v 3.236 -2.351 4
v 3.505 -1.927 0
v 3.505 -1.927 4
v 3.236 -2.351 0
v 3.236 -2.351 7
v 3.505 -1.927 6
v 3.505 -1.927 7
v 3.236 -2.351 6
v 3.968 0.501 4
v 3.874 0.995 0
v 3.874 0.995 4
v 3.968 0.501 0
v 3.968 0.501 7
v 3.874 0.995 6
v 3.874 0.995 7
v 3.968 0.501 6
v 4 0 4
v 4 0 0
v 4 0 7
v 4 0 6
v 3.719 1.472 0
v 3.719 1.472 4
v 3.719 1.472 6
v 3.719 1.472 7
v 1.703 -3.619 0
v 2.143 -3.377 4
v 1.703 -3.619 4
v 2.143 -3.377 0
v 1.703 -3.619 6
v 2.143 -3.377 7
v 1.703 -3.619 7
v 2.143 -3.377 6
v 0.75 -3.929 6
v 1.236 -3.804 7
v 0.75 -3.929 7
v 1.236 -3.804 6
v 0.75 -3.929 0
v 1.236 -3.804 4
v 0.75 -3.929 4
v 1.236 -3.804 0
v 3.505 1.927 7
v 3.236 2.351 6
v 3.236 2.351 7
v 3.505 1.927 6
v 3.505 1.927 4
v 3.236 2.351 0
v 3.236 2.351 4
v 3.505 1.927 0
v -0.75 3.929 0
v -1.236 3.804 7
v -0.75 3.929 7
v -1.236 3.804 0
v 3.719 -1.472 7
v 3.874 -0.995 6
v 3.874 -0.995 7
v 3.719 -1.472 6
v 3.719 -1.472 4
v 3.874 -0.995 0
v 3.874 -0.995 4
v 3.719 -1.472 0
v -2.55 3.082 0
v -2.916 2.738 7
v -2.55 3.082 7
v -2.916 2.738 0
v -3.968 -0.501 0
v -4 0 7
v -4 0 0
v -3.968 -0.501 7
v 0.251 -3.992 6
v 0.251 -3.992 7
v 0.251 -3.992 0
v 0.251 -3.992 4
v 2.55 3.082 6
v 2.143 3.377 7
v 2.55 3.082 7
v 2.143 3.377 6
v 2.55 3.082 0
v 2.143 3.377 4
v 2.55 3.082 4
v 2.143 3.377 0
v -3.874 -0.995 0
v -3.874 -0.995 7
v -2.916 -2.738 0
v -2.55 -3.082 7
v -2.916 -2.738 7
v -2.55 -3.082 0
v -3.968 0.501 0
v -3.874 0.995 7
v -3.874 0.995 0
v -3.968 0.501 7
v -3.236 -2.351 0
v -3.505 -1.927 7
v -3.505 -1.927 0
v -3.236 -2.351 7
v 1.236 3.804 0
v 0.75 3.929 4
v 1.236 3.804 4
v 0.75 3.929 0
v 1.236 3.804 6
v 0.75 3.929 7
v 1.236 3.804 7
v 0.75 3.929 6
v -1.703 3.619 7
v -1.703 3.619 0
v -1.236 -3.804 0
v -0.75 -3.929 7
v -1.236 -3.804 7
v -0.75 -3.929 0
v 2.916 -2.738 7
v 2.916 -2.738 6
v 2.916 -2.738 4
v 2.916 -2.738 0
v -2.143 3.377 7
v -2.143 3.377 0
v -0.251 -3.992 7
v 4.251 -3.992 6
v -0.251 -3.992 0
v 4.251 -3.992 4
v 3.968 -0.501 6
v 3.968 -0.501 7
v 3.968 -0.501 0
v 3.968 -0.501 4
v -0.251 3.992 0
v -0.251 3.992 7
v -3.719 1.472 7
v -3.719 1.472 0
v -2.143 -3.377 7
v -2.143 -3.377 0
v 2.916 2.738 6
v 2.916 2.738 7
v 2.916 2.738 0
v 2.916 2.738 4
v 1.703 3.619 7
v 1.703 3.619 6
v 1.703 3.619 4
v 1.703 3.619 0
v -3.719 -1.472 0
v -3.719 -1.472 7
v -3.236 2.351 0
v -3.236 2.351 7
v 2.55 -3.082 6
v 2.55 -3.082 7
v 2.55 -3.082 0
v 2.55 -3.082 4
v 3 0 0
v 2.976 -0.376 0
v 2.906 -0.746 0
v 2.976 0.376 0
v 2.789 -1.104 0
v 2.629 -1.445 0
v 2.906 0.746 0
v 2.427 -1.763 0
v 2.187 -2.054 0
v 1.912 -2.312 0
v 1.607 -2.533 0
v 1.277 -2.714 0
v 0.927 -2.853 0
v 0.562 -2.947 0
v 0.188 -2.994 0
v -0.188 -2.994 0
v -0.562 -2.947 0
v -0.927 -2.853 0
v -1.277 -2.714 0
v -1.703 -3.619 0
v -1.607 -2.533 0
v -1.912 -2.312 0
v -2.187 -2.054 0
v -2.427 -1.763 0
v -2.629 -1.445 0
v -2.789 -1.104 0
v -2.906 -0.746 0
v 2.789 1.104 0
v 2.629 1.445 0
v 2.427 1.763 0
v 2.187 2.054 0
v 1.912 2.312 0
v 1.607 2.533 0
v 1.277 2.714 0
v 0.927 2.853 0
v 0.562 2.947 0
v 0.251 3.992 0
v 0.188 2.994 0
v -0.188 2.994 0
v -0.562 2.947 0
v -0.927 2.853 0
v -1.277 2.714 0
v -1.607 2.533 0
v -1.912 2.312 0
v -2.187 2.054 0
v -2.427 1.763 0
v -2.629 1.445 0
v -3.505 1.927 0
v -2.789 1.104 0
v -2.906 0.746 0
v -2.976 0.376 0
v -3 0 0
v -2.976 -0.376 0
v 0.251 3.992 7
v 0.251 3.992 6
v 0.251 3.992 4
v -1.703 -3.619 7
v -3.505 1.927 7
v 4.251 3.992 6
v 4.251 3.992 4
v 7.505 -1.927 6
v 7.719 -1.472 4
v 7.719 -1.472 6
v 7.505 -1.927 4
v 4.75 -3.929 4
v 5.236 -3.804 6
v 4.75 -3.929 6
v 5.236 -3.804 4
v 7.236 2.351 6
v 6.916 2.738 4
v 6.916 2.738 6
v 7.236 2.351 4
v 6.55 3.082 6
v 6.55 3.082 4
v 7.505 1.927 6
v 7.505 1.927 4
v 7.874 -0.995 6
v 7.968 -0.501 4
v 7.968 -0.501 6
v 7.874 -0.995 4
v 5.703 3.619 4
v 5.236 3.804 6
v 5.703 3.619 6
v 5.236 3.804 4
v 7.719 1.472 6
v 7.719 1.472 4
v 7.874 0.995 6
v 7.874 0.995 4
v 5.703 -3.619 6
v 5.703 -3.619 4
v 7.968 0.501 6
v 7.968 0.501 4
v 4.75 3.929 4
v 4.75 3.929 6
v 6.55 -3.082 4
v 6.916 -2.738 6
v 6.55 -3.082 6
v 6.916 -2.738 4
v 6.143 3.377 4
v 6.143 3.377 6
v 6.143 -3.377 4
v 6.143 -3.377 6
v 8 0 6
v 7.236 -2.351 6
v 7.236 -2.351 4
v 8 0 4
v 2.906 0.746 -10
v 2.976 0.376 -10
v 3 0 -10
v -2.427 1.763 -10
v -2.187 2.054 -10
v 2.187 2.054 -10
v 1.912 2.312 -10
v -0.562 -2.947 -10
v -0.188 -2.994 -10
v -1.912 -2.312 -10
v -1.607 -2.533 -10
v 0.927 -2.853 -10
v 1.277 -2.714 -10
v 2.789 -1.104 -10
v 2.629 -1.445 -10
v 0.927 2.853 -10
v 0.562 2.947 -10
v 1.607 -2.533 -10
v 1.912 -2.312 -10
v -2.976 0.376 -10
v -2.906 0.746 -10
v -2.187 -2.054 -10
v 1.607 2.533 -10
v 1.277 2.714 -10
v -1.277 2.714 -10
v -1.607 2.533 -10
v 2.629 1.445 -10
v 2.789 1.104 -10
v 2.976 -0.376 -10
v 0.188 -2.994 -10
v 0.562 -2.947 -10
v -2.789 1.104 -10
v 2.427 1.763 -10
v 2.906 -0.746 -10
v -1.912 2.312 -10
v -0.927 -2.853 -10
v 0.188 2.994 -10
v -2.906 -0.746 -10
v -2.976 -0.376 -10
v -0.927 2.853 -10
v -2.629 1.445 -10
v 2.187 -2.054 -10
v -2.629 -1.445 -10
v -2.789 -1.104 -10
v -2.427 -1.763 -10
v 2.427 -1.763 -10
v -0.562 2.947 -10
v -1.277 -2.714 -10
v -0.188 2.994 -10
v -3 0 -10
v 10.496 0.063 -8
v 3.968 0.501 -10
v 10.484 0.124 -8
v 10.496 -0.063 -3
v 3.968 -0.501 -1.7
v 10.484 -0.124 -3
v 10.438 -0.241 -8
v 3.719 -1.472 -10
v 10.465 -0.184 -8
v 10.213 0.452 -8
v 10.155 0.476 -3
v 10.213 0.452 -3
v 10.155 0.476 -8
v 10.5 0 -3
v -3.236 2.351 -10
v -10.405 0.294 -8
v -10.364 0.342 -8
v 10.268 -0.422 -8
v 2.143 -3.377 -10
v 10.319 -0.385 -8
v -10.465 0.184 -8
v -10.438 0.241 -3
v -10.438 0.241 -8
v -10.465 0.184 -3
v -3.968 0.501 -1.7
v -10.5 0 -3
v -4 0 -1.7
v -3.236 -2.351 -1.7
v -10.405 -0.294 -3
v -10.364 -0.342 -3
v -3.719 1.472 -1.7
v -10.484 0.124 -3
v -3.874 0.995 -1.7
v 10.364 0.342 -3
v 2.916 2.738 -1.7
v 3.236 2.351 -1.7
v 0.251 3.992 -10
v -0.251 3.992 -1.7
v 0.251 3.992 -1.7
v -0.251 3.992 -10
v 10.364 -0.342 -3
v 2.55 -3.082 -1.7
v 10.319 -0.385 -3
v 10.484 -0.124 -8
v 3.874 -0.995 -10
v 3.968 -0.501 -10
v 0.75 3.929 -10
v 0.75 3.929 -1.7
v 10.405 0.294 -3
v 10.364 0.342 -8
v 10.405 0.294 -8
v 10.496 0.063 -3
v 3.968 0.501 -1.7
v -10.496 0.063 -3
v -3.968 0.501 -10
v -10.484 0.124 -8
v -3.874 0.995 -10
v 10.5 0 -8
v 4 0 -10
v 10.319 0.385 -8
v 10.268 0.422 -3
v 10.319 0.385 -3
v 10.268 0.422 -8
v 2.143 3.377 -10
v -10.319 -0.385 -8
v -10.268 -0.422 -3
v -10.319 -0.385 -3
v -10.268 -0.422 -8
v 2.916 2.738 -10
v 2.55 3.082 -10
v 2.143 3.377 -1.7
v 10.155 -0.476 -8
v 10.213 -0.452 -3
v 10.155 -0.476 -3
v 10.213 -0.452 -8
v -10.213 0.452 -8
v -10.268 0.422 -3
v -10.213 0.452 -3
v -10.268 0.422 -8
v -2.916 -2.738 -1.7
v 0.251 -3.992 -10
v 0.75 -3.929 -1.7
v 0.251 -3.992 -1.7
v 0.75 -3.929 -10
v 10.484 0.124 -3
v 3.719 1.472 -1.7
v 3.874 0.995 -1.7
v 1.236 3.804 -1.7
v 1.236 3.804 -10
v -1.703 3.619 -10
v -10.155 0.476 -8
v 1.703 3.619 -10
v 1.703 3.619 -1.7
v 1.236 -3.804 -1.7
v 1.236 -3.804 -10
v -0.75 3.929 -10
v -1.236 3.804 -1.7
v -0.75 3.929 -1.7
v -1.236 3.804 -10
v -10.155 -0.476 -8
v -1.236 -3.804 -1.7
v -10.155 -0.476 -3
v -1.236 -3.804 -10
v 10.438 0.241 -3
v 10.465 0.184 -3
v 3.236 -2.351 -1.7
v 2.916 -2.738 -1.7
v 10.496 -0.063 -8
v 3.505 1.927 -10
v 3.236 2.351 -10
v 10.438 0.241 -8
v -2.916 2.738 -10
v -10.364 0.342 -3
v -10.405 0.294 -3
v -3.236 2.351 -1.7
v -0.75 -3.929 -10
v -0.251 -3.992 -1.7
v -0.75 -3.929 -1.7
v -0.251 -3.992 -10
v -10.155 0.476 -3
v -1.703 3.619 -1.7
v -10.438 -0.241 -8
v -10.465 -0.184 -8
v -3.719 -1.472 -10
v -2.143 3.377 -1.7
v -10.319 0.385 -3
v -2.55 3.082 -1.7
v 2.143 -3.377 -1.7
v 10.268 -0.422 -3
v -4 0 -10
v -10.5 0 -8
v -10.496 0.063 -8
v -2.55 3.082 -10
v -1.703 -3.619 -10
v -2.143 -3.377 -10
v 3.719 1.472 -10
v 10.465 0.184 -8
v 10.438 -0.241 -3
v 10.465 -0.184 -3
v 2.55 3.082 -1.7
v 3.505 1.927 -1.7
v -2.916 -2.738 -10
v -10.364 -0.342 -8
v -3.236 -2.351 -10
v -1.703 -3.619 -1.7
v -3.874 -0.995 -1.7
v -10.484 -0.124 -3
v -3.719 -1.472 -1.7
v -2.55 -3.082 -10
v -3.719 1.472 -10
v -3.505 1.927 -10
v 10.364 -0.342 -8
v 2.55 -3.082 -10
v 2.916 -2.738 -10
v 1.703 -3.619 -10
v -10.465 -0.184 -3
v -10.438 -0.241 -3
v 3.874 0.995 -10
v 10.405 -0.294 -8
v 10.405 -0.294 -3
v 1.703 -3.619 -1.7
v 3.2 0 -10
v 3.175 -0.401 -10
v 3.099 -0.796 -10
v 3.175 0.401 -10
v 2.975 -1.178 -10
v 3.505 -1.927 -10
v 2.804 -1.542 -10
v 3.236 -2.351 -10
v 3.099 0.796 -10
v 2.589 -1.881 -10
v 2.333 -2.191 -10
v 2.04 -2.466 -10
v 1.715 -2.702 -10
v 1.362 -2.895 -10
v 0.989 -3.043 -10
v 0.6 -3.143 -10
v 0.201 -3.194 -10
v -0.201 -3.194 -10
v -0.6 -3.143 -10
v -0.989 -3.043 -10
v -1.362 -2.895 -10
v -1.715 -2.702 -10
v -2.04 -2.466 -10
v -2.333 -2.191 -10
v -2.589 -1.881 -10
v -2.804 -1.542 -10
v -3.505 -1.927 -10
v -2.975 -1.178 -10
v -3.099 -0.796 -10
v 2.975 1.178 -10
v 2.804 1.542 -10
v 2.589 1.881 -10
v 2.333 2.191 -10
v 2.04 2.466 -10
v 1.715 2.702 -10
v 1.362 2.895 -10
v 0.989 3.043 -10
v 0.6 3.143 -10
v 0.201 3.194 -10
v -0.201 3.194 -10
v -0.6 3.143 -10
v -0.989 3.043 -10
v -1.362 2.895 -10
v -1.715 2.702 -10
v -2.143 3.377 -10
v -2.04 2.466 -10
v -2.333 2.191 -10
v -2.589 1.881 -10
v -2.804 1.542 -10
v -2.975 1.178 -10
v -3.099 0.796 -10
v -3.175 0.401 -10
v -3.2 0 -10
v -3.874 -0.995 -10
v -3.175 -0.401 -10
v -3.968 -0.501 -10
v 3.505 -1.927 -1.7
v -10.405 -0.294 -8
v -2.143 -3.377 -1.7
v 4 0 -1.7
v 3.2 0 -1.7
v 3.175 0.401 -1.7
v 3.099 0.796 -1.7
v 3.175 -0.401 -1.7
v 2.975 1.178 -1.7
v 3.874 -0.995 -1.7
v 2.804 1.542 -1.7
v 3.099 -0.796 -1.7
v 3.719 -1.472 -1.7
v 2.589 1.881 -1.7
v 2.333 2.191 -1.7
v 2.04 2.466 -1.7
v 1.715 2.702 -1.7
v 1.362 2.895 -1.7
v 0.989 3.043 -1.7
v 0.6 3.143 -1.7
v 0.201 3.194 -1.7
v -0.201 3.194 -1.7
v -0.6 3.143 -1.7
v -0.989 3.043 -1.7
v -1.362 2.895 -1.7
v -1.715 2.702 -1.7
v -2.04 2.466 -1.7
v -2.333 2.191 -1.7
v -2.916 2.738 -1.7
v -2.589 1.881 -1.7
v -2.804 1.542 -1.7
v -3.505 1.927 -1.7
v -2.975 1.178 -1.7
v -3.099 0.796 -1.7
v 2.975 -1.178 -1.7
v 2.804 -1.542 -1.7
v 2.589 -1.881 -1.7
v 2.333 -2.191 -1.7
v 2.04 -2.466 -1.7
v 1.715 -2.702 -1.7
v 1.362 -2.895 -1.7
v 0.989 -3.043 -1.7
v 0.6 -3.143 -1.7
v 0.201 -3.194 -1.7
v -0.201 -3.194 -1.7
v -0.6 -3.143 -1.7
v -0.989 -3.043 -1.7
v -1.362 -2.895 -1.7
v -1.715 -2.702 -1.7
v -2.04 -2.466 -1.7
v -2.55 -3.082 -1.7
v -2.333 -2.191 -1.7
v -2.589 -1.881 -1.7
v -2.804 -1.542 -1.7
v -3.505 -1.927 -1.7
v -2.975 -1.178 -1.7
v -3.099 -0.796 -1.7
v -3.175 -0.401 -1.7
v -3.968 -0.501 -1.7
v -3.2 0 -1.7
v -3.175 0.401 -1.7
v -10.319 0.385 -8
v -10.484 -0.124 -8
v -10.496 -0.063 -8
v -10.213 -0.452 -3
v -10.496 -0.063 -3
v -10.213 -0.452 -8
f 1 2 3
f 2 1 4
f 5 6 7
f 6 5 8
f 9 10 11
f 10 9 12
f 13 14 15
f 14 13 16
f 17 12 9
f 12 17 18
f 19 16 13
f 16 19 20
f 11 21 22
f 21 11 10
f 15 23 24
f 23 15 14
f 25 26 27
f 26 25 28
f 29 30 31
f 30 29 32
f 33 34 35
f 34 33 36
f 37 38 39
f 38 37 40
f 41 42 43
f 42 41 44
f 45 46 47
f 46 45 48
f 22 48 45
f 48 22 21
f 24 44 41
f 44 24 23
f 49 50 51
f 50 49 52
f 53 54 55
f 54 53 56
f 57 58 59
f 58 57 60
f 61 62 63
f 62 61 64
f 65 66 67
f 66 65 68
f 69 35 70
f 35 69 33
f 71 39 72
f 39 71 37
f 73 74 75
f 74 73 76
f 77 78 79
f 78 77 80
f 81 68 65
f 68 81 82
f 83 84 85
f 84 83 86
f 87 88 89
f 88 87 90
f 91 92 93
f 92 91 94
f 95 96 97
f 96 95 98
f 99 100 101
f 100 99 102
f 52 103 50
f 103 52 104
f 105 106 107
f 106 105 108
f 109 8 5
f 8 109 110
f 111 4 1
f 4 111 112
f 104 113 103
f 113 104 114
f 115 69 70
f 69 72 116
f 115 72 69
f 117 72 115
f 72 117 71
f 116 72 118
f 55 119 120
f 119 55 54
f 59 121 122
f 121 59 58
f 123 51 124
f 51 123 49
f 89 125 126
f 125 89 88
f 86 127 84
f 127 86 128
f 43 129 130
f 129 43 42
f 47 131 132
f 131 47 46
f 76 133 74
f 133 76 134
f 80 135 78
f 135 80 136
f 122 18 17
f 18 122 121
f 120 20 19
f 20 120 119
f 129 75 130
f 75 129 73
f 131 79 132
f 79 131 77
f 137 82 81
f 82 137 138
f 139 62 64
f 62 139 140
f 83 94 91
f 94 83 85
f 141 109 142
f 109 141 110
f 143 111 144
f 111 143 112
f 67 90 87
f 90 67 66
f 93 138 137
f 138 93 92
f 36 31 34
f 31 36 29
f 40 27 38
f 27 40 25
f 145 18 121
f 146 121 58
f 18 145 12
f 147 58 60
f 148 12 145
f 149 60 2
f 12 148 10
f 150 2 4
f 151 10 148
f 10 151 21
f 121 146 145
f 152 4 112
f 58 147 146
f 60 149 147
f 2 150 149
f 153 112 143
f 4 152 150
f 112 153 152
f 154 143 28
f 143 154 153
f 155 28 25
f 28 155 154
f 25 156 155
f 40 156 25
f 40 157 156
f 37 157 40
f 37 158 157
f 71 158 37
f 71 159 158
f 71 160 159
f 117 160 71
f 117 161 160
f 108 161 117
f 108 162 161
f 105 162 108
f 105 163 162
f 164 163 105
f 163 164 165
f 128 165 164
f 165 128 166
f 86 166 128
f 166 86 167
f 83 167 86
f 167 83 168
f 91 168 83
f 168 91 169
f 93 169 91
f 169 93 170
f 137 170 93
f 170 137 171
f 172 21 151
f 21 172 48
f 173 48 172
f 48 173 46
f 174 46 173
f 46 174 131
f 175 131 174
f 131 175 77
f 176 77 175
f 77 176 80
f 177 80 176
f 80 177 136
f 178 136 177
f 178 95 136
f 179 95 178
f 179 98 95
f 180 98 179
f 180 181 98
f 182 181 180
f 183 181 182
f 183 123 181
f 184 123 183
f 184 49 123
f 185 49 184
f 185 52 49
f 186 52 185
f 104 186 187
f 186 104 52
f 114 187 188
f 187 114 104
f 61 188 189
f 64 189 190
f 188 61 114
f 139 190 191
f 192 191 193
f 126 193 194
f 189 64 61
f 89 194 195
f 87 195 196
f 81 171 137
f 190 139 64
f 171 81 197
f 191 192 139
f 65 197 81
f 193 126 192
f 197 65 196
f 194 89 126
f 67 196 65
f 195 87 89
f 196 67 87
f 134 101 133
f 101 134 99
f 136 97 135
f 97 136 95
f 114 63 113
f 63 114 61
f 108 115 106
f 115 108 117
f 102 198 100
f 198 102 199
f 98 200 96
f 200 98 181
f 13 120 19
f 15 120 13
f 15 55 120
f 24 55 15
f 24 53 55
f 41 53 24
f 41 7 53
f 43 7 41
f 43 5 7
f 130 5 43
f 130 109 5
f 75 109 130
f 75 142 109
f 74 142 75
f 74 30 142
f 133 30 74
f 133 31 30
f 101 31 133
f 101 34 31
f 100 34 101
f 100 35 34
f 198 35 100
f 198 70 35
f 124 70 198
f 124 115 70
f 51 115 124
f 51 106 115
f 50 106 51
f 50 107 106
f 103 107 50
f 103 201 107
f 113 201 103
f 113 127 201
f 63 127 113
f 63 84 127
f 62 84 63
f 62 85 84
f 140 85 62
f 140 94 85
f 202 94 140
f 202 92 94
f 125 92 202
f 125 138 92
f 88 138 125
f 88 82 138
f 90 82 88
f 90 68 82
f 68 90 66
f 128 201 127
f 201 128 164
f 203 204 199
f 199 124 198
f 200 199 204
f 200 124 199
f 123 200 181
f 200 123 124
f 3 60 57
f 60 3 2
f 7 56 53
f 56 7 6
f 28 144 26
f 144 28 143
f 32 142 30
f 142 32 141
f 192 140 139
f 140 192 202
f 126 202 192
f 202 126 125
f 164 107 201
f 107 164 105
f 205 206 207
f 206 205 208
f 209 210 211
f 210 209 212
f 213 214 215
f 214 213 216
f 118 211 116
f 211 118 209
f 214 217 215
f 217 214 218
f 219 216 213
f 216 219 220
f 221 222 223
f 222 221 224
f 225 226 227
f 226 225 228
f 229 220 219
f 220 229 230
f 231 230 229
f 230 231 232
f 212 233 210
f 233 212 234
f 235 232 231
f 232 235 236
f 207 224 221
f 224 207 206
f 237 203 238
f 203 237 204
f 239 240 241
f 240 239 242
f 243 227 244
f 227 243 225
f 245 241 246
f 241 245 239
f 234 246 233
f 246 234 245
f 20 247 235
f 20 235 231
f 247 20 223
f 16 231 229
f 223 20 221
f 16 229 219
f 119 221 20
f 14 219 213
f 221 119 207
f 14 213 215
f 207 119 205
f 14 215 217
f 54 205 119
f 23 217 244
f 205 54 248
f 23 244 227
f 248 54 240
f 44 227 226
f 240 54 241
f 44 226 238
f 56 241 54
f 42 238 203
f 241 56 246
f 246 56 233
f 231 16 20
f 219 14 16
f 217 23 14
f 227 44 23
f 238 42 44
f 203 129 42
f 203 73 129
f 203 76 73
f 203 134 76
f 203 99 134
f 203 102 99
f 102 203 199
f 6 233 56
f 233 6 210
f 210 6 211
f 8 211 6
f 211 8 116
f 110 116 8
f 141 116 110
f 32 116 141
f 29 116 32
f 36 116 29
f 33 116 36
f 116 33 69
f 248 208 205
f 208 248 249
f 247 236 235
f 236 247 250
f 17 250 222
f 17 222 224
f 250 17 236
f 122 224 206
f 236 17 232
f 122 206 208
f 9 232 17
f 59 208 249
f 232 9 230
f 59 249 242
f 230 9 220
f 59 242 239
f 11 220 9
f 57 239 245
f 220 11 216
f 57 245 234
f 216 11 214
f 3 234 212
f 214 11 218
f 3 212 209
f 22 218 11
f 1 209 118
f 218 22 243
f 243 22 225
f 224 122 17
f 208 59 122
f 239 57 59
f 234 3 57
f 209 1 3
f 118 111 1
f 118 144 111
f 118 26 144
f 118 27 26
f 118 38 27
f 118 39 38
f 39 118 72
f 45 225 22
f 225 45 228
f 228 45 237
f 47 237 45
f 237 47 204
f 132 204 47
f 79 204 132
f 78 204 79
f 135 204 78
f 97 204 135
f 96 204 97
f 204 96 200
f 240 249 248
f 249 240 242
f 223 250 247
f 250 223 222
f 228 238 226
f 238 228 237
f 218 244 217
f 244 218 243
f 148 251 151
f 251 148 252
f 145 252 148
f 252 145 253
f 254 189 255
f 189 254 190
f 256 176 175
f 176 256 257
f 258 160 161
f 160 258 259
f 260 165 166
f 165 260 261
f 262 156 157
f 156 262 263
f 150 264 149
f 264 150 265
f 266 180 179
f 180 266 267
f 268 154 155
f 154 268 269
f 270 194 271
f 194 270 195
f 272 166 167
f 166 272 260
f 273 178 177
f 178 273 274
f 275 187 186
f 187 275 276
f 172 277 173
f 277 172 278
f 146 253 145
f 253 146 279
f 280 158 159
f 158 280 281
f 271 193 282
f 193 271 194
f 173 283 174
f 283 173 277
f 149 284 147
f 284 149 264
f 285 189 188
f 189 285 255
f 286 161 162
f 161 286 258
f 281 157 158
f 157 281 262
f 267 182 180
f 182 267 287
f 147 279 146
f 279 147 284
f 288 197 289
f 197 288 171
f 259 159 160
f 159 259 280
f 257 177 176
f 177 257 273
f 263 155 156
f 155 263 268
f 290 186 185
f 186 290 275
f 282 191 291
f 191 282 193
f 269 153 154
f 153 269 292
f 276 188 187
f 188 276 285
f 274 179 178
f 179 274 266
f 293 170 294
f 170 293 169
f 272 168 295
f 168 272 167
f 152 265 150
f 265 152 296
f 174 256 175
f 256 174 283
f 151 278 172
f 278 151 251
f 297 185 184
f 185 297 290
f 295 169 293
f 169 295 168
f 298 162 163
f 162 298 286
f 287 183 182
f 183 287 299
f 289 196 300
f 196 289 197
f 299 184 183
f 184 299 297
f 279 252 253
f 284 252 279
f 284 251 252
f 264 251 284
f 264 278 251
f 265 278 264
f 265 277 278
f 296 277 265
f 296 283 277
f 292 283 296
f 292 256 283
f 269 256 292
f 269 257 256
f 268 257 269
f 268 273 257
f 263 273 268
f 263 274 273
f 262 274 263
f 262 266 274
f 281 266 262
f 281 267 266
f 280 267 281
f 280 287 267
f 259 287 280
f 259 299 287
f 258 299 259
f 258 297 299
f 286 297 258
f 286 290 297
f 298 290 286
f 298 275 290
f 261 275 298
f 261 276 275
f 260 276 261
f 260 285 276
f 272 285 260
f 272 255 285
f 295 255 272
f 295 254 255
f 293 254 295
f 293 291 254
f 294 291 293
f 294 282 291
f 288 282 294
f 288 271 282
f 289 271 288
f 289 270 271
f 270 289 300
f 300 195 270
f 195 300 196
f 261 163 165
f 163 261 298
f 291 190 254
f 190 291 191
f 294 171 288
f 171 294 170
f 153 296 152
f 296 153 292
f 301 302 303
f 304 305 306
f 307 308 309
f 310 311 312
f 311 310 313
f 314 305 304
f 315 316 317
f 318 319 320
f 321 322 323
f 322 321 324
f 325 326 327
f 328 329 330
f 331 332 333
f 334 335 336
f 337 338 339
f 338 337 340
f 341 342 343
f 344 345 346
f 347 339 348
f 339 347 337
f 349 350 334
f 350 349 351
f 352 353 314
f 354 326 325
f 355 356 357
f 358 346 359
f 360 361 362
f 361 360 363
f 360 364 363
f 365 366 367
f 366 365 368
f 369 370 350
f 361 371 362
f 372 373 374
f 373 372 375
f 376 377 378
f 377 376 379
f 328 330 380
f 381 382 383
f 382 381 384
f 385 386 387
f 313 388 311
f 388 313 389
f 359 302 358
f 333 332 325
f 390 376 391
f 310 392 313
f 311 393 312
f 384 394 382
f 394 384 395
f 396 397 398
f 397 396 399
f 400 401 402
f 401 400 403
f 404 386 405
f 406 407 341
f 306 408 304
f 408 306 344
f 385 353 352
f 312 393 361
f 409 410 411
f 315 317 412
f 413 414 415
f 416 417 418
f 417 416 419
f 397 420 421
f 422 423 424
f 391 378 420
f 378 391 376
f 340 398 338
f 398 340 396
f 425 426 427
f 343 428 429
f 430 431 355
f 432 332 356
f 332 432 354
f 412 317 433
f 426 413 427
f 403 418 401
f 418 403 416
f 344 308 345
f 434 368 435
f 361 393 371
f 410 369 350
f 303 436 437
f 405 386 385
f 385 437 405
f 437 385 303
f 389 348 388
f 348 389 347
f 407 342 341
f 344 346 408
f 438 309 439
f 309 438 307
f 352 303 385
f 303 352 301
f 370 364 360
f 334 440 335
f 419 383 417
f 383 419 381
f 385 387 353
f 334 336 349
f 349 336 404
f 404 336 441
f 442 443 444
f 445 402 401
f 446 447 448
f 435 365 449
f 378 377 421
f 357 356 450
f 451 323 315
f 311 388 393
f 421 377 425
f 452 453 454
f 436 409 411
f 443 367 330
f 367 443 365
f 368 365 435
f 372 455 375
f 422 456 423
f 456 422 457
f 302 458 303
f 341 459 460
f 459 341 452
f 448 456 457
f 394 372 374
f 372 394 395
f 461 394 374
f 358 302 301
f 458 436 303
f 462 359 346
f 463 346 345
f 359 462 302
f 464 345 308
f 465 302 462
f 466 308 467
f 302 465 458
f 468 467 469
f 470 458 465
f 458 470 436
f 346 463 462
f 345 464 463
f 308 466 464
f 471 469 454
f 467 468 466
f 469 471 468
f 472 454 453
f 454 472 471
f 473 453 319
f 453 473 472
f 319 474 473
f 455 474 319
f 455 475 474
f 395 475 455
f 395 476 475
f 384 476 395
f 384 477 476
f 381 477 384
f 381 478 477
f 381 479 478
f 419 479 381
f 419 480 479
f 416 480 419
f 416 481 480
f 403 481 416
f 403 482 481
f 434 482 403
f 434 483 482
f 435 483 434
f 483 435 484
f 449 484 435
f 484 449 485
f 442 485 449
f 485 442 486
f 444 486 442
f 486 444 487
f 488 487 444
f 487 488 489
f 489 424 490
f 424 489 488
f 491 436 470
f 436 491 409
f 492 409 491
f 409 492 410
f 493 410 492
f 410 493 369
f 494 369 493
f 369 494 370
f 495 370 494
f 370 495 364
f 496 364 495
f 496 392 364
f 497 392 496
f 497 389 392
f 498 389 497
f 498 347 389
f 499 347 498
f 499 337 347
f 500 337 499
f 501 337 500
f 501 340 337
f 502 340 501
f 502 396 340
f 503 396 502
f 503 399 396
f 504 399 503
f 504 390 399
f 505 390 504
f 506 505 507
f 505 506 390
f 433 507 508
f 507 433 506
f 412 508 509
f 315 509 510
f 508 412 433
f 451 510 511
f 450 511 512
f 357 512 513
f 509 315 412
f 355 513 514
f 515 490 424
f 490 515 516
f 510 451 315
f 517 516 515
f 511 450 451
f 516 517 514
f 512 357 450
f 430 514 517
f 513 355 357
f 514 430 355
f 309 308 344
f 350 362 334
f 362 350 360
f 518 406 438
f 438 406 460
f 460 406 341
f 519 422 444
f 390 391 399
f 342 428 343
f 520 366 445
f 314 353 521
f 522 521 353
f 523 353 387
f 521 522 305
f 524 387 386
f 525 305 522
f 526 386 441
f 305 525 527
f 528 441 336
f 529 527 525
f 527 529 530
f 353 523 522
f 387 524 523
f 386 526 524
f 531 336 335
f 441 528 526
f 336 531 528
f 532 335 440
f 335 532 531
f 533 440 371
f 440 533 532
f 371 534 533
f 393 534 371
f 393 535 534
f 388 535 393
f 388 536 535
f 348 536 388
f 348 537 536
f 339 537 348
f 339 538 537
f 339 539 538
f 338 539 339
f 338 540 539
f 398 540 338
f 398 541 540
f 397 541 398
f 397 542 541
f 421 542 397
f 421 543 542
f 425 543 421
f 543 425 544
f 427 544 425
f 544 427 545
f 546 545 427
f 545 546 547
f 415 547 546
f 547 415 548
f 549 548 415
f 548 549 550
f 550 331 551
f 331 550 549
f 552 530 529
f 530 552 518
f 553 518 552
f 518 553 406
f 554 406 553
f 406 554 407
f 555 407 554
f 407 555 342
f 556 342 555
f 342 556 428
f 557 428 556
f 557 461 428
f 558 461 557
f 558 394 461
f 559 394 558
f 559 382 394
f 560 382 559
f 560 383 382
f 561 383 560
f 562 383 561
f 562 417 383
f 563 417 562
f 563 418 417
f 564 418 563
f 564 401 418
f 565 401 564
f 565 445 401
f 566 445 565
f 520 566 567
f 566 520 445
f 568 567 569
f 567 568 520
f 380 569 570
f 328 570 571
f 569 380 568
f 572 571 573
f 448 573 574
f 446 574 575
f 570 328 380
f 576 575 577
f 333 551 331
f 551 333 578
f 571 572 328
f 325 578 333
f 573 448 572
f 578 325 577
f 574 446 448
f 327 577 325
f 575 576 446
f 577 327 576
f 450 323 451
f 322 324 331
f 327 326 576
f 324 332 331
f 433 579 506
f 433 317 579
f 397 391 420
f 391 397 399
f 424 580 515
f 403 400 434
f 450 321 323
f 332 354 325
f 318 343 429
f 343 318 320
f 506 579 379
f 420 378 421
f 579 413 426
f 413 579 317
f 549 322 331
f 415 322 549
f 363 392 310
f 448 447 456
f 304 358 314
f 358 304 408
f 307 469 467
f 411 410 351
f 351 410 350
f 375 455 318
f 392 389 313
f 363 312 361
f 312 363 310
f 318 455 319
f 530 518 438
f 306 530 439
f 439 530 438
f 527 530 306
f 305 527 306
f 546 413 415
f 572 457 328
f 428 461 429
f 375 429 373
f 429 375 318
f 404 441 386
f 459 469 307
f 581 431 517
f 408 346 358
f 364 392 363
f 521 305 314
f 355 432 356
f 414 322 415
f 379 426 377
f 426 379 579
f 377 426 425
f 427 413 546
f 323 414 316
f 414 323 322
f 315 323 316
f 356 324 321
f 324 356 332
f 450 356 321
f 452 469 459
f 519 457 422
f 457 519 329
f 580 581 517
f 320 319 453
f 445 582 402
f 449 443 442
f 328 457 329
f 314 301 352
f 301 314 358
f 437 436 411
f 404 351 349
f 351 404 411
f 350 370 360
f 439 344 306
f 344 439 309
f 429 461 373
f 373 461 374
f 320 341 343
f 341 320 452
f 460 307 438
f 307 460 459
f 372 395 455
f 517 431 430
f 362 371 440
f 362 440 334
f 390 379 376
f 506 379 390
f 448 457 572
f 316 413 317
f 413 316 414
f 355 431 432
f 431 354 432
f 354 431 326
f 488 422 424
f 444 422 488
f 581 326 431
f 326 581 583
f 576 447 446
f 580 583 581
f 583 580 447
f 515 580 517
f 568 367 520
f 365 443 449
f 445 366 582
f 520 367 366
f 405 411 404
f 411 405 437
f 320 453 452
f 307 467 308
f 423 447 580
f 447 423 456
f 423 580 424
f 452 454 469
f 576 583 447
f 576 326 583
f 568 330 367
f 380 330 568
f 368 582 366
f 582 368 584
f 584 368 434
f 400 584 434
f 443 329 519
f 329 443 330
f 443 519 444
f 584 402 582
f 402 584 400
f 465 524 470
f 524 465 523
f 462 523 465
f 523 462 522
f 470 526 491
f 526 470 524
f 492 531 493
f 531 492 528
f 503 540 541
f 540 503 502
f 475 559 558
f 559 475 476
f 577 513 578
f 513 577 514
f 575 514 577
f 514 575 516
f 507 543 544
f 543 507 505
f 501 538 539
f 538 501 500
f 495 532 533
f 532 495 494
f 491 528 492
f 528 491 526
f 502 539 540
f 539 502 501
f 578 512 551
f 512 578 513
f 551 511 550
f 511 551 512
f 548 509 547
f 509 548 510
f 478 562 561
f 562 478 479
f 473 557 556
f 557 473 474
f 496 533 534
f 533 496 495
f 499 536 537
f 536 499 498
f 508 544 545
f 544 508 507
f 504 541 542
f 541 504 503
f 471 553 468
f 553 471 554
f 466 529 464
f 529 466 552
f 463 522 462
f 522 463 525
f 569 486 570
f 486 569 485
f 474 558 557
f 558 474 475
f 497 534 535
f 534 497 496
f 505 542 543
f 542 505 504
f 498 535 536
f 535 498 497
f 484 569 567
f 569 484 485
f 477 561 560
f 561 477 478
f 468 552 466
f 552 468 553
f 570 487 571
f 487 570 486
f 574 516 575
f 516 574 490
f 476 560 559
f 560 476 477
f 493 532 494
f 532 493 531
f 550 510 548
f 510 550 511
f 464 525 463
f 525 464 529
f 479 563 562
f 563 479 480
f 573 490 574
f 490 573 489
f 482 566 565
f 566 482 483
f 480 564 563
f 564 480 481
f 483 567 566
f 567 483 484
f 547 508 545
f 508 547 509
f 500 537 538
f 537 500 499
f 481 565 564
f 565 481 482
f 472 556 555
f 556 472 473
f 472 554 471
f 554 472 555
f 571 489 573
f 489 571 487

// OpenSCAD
// file: ../planelib/ruder.scad
module RuderAdd3() // elements to ruder
{
   p0 = [-ptRuder.x * s[ruderseg] + o[ruderseg].x, o[ruderseg].z];
   p1 = [-ptRuder.x * s[ruderseg+1] + o[ruderseg+1].x, o[ruderseg+1].z];
   p2 = [-s[ruderseg+1] + o[ruderseg+1].x, o[ruderseg+1].z];
   p3 = [-s[ruderseg] + o[ruderseg].x, o[ruderseg].z];
   d0 = hRuder * s[ruderseg];
   d1 = hRuder * s[ruderseg+1];

   intersection(){
       union(){
           hull(){ // drehachse
                translate([p0.x, ptRuder.y*s[ruderseg] ,p0.y])
                cylinder(d=d0,h=0.01);
               translate([p1.x, ptRuder.y*s[ruderseg+1] ,p1.y])
                cylinder(d=d1,h=0.01);
                }

            // schnitt an der achse
           translate([0, 50/2, 0])
           rotate([90,0,0])
           linear_extrude(height=50)
           polygon([p0,p1,p2,p3]);
           }
       difference(){
           segment([s[ruderseg],s[ruderseg+1]], [o[ruderseg],o[ruderseg+1]], r=0);
           wingPolyLine( d=dPoly, pt=ptRuder, off=[+0,+0] );
           translate([0, 50/2, 0])
           rotate([90,0,0])
           linear_extrude(height=50)
           polygon([p1+[(d1+1)/2,-1],p1+[(d1+1)/2,0], p2, p2+[0,-1]]);
           }
       RuderDiff2Mask();
       }
}

module RuderAdd2() // add elements to sement
{
   p0 = [-ptRuder.x * s[ruderseg] + o[ruderseg].x, o[ruderseg].z];
   p1 = [-ptRuder.x * s[ruderseg+1] + o[ruderseg+1].x, o[ruderseg+1].z];
   p2 = [-s[ruderseg+1] + o[ruderseg+1].x, o[ruderseg+1].z];
   p3 = [-s[ruderseg] + o[ruderseg].x, o[ruderseg].z];
   p4 = [+ o[ruderseg+1].x, o[ruderseg+1].z];
   p5 = [+ o[ruderseg].x, o[ruderseg].z];
   d0 = hRuder * s[ruderseg];
   d1 = hRuder * s[ruderseg+1];

   intersection(){
       union(){
           hull(){ // drehachse
                translate([p0.x, ptRuder.y*s[ruderseg] ,p0.y])
                cylinder(d=d0,h=0.01);
               translate([p1.x, ptRuder.y*s[ruderseg+1] ,p1.y])
                cylinder(d=d1,h=0.01);
                }

            // schnitt an der achse
           translate([0, 50/2, 0])
           rotate([90,0,0])
           linear_extrude(height=50)
           polygon([p0,p1,p4,p5]);
           }
       difference(){
           segment([s[ruderseg],s[ruderseg+1]], [o[ruderseg],o[ruderseg+1]], r=0);
           wingPolyLine( d=dPoly, pt=ptRuder, off=[+0,+0] );
           translate([0, 50/2, 0])
           rotate([90,0,0])
           linear_extrude(height=50)
           *polygon([p1+[(d1+1)/2,-1],p1+[(d1+1)/2,0], p2, p2+[0,-1]]);
           }
       RuderDiff2MaskInv();
       }
}

module RuderCut2() // cut the ruder from segmen
{
   p0 = [-ptRuder.x * s[ruderseg] + o[ruderseg].x, o[ruderseg].z];
   p1 = [-ptRuder.x * s[ruderseg+1] + o[ruderseg+1].x, o[ruderseg+1].z];
   p2 = [-s[ruderseg+1] + o[ruderseg+1].x, o[ruderseg+1].z];
   p3 = [-s[ruderseg] + o[ruderseg].x, o[ruderseg].z];
   d0 = hRuder * s[ruderseg];
   d1 = hRuder * s[ruderseg+1];

    // schnitt an der achse
   translate([0, 50/2, 0])
    rotate([90,0,0])
     linear_extrude(height=50)
      polygon([p0,p1,p2,p3]);
   RuderDiff2Axis( rot = 400, doff=-0.5 );
}

module RuderCut3() // cut the segment from the ruder
{
   p0 = [-ptRuder.x * s[ruderseg] + o[ruderseg].x, o[ruderseg].z];
   p1 = [-ptRuder.x * s[ruderseg+1] + o[ruderseg+1].x, o[ruderseg+1].z];
   p2 = [-s[ruderseg+1] + o[ruderseg+1].x, o[ruderseg+1].z];
   p3 = [-s[ruderseg] + o[ruderseg].x, o[ruderseg].z];
   p4 = [+ o[ruderseg+1].x, o[ruderseg+1].z];
   p5 = [+ o[ruderseg].x, o[ruderseg].z];
   d0 = hRuder * s[ruderseg];
   d1 = hRuder * s[ruderseg+1];

    // schnitt an der achse
   translate([0, 50/2, 0])
    rotate([90,0,0])
     linear_extrude(height=50)
      polygon([p0,p1,p4,p5]);
   RuderDiff2Axis( rot = 400, doff=-0.5 );
}

module RuderDiff2( doff = 0.5 ) // cut element from segment
{
   intersection(){
        RuderDiff2Axis( rot = 0, doff=0 );
        RuderDiff2Mask( doff=0 );
        }
   RuderDiff2Axis( rot = 0, doff = -doff );
}

module RuderDiff3( doff = 0.5 ) // cut elements from ruder
{
    difference(){
        RuderDiff2Axis( rot = 180, doff=0 );
        RuderDiff2Mask( doff = +doff );
        }
    RuderDiff2Axis( rot = 180, doff = -doff );
    translate([-s[ruderseg],-50,0]+o[ruderseg]) cube( [100,100,doff], center=false );
    translate([-s[ruderseg+1],-50,-doff]+o[ruderseg+1]) cube( [100,100,doff], center=false );
    
   
}


module RuderDiff2Mask( doff = 0.5 )
{   //todo: this has to depend on o,s...
    translate([-150,0,50]+o[ruderseg]) cube( [100,50,50-doff], center=true );
    translate([-150,0,150]+o[ruderseg]) cube( [100,50,50-doff], center=true );
}
module RuderDiff2MaskInv( doff = 0.5 )
{   //todo: this has to depend on o,s...
    translate([-170,0,0]+o[ruderseg]) cube( [100,50,50-doff], center=true );
    translate([-160,0,100]+o[ruderseg]) cube( [100,50,50-doff], center=true );
    translate([-150,0,200]+o[ruderseg]) cube( [100,50,50-doff], center=true );
}

// axis with rotation limits used as mask
module RuderDiff2Axis( rot=0, doff=0 )
{
   p0 = [-ptRuder.x * s[ruderseg] + o[ruderseg].x, o[ruderseg].z];
   p1 = [-ptRuder.x * s[ruderseg+1] + o[ruderseg+1].x, o[ruderseg+1].z];
   d0 = hRuder * s[ruderseg] - doff;
   d1 = hRuder * s[ruderseg+1] - doff;
   w = 40; // max ruder angle

   
  hull(){ 
    translate([p0.x, ptRuder.y*s[ruderseg] ,p0.y]) {
        cylinder( d=d0, h=0.01, center=false );
        if( rot < 360 ){
            rotate([0,0,rot+w]) translate([-2*d0,-d0/2,0]) cube([2*d0, d0, 0.01], center=false );
            rotate([0,0,rot-w]) translate([-2*d0,-d0/2,0]) cube([2*d0, d0, 0.01], center=false );
            }
        }
    translate([p1.x, ptRuder.y*s[ruderseg+1] ,p1.y]) {
        cylinder( d=d1, h=0.01, center=false );
        if( rot < 360 ){
            rotate([0,0,rot+w]) translate([-2*d1,-d1/2,0]) cube([2*d1, d1, 0.01], center=false );
            rotate([0,0,rot-w]) translate([-2*d1,-d1/2,0]) cube([2*d1, d1, 0.01], center=false );
            }
        }
    }
}

module RuderHorn()
{

    p0 = [-ptRuder.x * s[ruderseg] + o[ruderseg].x, o[ruderseg].z];
    p1 = [-ptRuder.x * s[ruderseg+1] + o[ruderseg+1].x, o[ruderseg+1].z];
    pm = (p0 + p1)/2;
    sm = (s[ruderseg]+s[ruderseg+1])/2;

    translate([pm.x,ptRuder.y*sm ,pm.y + 24 ])
    rotate([0,ruderrot, 2])
    difference()
    {
        hull()
        {
            translate([-5,2,0]) cylinder(d=2,h=4);
            translate([2,12,0]) cylinder(d=6,h=2);
            translate([-20,0,0]) cylinder(d=2,h=4);
        }
        translate([2,12,0]) cylinder(d=1.5,h=2);
   }
}
// file: ../planelib/servo.scad
servo_size_1 = [25.5,12,37];  // mg90s
servo_size_2 = [33.5,12,3];

*servo_sg90($fn=50);

module servo_sg90()
{
        cube( servo_size_1, center=true );
        translate([0,0,3.5]) 
            cube( servo_size_2, center=true );
        // servoarm...
        translate([-5,6,17])
        resize([60,12,6])
        sphere( d=1 );
}
    

module ServoDiff( i=ruderseg, sy=7 )
{ 
    sx = s[i]*(tubeOffset1+tubeOffset2)/2;  // between the tubes
    sz = (o[i+1].z-o[i].z)/2;   // in the middle of the segment
    translate( o[i] + [-sx, sy, sz])
            rotate([0,ruderrot, 2])
                servo_sg90();
                
    
    // kabelkanal
    *translate( o[i] + [-sx+10, +11-2-2, hz/2-13])
            rotate([0,90,4])
                cube([12,5,10]);
}
// file: ../planelib/polyline.scad
module wingPolyLine( d=3, pt=[0,0], off=[0,0]  )
{
    *echo(pt);
    l = len(s)-1; 
    poly = [         [o[0].x - s[0]*pt.x - off.x , o[0].y + s[0]*pt.y + off.y,  o[0].z - 20 ],
        for(i=[0:l]) [o[i].x - s[i]*pt.x - off.x , o[i].y + s[i]*pt.y + off.y,  o[i].z ],
                     [o[l].x - s[l]*pt.x - off.x , o[l].y + s[l]*pt.y + off.y,  o[l].z + 20 ] ];
    *echo( poly);
    for( i=[0:(len(poly)-2)] ){
        hull(){
            translate(poly[i]) 
                sphere( d=d );
            translate(poly[i+1]) 
                sphere( d=d );
            }
        }
}

module fusePolyLine( d=3, size=605, off=[0,0], p=pClarkFusePolyUp )
{
    for( i=[0:(len(p)-2)] ){
        hull(){
            translate([p[i].x*size, p[i].y*size+off.y, +off.x]) 
                sphere( d=d );
            translate([p[i+1].x*size, p[i+1].y*size+off.y, +off.x]) 
                sphere( d=d );
            }
        *echo( p[i] );
        }
}

module fusePolyLineQ( d=3, size=605, pt=[0,0], off=[0,0] )
{
    poly = [        
                    [o[1].x - s[1]*pt.x - off.x , o[1].y + s[1]*pt.y + off.y,  +o[1].z ],
                    [o[0].x - s[0]*pt.x - off.x , o[0].y + s[0]*pt.y + off.y,  +o[0].z ],
                    [o[0].x - s[0]*pt.x - off.x , o[0].y + s[0]*pt.y + off.y,  -o[0].z ], 
                    [o[1].x - s[1]*pt.x - off.x , o[1].y + s[1]*pt.y + off.y,  -o[1].z ]
                    ];
                    
        for( i=[0:(len(poly)-2)] ){
                hull(){
                    translate(poly[i]) 
                        sphere( d=d );
                    translate(poly[i+1]) 
                        sphere( d=d );
                    }
        }
}

module offsetPolyLine(  d=3, size=605, off=10, p=pClarkY )  // this does not yet work, just a test.
{
    for( i=[0:(len(p)-1)] ){
        po = size * p[i];
        pv = size * ((i>0) ? p[i-1] : p[len(p)-1]);
        pn = size * ((i>(len(p)-2)) ? p[0] : p[i+1]);

        pop = (pv + pn)/2 + po;
        p02 = pn - po;
        z = p02.x * pop.y + p02.y * pop.x;
        
        pt = sign( z ) * pop * (off/norm(pop));
       

        
        hull(){
            translate([po.x+pt.x, po.y+pt.y, 0]) 
                sphere( d=d );
            translate([pn.x+pt.x, pn.y+pt.y, 0]) 
                sphere( d=d );
            }
        echo( po, pop, z );
    }
}
// file: ../planelib/wing.scad
module segment( s, o, r=0, p=pSD6060, begin=0, end=1 )
{
    factor = ( s[1] ) / ( s[0] );
    height = ( o[1].z - o[0].z );
    sx = ( o[1].x - o[0].x ) / height;
    sy = ( o[1].y - o[0].y ) / height;
    
    m=[ [ 1, 0,  sx, 0],
        [ 0, 1,  sy, 0],
        [ 0, 0,  1,  0],
        [ 0, 0,  0,  1] ];
    
    translate(o[0])
        multmatrix(m)
            linear_extrude( height=height, scale=factor, convexity=10 ) 
                intersection()
                {
                    spant2d( s=s[0], r=r, p=p );
                    scale(s) 
                        mirror([1,0]) // vgl spant2d()
                            translate( [begin,-0.5] ) 
                                square( [(end-begin), 1] );
                }
}


module spant3d( d=0.3, offset=[0,0,0], size=100, r=0, p=pSD6060 )
{
    translate(offset) linear_extrude( d, convexity=10 ) spant2d(size,r,p);
}

module spant3dDiff( d=0.3, offset=[0,0,0], size=100, rot=[0,0,0], ra=0, ri=-2.5, p=pSD6060 )
{
    translate(offset) rotate(rot) translate([0,0,-d/2]) linear_extrude( height=d, convexity=10 )
    difference()
    {
        spant2d( s=size, r=ra, p=p );
        spant2d( s=size, r=ri, p=p );
    }
}

module spant2d(s=1, r=0, p=pSD6060 )
{
    offset(delta=r)
    //alternative: offset(r=r)
    scale(s)
    mirror([1,0])  // sollte das weg?
    polygon(p);
}
// file: ../planelib/skin.scad
module outerSkin( d=1, h=0, center=true )
{
    hgt = (h<=0) ? h : 2*d;
    difference(){
        minkowski(){
            children();
            cylinder(r=d,h=hgt,center=center ); 
        }
        children();
    }
}

module outerSkin2( d=1, h=0, center=true )
{
    hgt = (h<=0) ? h : 2*d;
    difference(){
        minkowski(){
            children(0);
            cylinder(r=d,h=hgt,center=center ); 
        }
        children(1);
    }
}

module innerSkin( )
{
    difference(){
        children(0);
        children(1);    
        }
}

module skin2()
{
    difference()
    {
        minkowski()
        {
            children(0);
            children(1);    
        }
        children(0);
    }
}

module Slice( )
{
    intersection()
    {
        children(0);
        children(1);
    }
}

module gridSlice( dy=30, angy=30, grid=2, dim=1000 )
{
    Slice(){
        children();
        for(z=[-dim:dy:dim], angy=[-angy,+angy])  
            translate([0,0,z])  
                rotate([0,angy,0])
                    cube([dim,dim,grid], center=true );
    }

}

module linearSlice( sh=100, sx=100, org=[0,0,0], rot=[0,0,0], center=true )
{
    Slice()
    {
        children();
        translate( org + [0,0,+sh/2] )
            rotate( rot )
                cube( [4*sx,2*sx,sh], center=center );
    }
}

module radialSlice( sh=100, sx=100, org=[0,0,0], rot=[0,0,0], mode=0, center=true )
{
    Steps = 120;
    Slice()
    {
        children();
        translate( org + [0,0,0] )
            rotate( rot )
                radialSliceHelper( d=2*sx, sh=sh, mode, center );
    }
}

module radialSliceHelper( d, sh, mode=0, center=true )
{
    gap = 0.5;
    
    if( mode==0 ){
        cylinder( d=d, h=sh, center=center );
        }
            
    if( mode==1 ){
        difference(){
            union(){
                cylinder( d=d, h=sh, center=center );
                for( r=[0:120:360] )
                    translate([0,0,0]) rotate([0,90,r]) cylinder( d=10, h=d, center=center );
                }
            union(){
                for( r=[0:120:360] )
                    translate([0,0,sh]) rotate([0,90,r]) cylinder( d=10+0.2, h=d, center=center );
                }
            }
        }
 //hier war der marker..       
    if( mode==2 ){
        cx=5;
        cy=d/10;
        difference(){
            union(){
                cylinder( d=d, h=sh, center=center );
                for( r=[0:90:360] )
                    translate([0,0,0]) rotate([0,90,r]) cube([cx,cy,d],center=false); // d is diameter, cx,cy is size
                }
            union(){
                for( r=[0:90:360] )
                    translate([0,0,sh]) 
                        rotate([0,90,r]) 
                            translate([-gap,-gap/2,0])
                                cube([cx+gap*2,cy+gap,d],center=false);
                }
            }
        }
}

module show( d = [10,10,10] )
{
    for( i=[0:$children-1] )
    {
    translate( i * d )
        children(i);
    }
}
// main file
include <../planelib/inspectoer.scad>

fuseCoverHookKnop();
